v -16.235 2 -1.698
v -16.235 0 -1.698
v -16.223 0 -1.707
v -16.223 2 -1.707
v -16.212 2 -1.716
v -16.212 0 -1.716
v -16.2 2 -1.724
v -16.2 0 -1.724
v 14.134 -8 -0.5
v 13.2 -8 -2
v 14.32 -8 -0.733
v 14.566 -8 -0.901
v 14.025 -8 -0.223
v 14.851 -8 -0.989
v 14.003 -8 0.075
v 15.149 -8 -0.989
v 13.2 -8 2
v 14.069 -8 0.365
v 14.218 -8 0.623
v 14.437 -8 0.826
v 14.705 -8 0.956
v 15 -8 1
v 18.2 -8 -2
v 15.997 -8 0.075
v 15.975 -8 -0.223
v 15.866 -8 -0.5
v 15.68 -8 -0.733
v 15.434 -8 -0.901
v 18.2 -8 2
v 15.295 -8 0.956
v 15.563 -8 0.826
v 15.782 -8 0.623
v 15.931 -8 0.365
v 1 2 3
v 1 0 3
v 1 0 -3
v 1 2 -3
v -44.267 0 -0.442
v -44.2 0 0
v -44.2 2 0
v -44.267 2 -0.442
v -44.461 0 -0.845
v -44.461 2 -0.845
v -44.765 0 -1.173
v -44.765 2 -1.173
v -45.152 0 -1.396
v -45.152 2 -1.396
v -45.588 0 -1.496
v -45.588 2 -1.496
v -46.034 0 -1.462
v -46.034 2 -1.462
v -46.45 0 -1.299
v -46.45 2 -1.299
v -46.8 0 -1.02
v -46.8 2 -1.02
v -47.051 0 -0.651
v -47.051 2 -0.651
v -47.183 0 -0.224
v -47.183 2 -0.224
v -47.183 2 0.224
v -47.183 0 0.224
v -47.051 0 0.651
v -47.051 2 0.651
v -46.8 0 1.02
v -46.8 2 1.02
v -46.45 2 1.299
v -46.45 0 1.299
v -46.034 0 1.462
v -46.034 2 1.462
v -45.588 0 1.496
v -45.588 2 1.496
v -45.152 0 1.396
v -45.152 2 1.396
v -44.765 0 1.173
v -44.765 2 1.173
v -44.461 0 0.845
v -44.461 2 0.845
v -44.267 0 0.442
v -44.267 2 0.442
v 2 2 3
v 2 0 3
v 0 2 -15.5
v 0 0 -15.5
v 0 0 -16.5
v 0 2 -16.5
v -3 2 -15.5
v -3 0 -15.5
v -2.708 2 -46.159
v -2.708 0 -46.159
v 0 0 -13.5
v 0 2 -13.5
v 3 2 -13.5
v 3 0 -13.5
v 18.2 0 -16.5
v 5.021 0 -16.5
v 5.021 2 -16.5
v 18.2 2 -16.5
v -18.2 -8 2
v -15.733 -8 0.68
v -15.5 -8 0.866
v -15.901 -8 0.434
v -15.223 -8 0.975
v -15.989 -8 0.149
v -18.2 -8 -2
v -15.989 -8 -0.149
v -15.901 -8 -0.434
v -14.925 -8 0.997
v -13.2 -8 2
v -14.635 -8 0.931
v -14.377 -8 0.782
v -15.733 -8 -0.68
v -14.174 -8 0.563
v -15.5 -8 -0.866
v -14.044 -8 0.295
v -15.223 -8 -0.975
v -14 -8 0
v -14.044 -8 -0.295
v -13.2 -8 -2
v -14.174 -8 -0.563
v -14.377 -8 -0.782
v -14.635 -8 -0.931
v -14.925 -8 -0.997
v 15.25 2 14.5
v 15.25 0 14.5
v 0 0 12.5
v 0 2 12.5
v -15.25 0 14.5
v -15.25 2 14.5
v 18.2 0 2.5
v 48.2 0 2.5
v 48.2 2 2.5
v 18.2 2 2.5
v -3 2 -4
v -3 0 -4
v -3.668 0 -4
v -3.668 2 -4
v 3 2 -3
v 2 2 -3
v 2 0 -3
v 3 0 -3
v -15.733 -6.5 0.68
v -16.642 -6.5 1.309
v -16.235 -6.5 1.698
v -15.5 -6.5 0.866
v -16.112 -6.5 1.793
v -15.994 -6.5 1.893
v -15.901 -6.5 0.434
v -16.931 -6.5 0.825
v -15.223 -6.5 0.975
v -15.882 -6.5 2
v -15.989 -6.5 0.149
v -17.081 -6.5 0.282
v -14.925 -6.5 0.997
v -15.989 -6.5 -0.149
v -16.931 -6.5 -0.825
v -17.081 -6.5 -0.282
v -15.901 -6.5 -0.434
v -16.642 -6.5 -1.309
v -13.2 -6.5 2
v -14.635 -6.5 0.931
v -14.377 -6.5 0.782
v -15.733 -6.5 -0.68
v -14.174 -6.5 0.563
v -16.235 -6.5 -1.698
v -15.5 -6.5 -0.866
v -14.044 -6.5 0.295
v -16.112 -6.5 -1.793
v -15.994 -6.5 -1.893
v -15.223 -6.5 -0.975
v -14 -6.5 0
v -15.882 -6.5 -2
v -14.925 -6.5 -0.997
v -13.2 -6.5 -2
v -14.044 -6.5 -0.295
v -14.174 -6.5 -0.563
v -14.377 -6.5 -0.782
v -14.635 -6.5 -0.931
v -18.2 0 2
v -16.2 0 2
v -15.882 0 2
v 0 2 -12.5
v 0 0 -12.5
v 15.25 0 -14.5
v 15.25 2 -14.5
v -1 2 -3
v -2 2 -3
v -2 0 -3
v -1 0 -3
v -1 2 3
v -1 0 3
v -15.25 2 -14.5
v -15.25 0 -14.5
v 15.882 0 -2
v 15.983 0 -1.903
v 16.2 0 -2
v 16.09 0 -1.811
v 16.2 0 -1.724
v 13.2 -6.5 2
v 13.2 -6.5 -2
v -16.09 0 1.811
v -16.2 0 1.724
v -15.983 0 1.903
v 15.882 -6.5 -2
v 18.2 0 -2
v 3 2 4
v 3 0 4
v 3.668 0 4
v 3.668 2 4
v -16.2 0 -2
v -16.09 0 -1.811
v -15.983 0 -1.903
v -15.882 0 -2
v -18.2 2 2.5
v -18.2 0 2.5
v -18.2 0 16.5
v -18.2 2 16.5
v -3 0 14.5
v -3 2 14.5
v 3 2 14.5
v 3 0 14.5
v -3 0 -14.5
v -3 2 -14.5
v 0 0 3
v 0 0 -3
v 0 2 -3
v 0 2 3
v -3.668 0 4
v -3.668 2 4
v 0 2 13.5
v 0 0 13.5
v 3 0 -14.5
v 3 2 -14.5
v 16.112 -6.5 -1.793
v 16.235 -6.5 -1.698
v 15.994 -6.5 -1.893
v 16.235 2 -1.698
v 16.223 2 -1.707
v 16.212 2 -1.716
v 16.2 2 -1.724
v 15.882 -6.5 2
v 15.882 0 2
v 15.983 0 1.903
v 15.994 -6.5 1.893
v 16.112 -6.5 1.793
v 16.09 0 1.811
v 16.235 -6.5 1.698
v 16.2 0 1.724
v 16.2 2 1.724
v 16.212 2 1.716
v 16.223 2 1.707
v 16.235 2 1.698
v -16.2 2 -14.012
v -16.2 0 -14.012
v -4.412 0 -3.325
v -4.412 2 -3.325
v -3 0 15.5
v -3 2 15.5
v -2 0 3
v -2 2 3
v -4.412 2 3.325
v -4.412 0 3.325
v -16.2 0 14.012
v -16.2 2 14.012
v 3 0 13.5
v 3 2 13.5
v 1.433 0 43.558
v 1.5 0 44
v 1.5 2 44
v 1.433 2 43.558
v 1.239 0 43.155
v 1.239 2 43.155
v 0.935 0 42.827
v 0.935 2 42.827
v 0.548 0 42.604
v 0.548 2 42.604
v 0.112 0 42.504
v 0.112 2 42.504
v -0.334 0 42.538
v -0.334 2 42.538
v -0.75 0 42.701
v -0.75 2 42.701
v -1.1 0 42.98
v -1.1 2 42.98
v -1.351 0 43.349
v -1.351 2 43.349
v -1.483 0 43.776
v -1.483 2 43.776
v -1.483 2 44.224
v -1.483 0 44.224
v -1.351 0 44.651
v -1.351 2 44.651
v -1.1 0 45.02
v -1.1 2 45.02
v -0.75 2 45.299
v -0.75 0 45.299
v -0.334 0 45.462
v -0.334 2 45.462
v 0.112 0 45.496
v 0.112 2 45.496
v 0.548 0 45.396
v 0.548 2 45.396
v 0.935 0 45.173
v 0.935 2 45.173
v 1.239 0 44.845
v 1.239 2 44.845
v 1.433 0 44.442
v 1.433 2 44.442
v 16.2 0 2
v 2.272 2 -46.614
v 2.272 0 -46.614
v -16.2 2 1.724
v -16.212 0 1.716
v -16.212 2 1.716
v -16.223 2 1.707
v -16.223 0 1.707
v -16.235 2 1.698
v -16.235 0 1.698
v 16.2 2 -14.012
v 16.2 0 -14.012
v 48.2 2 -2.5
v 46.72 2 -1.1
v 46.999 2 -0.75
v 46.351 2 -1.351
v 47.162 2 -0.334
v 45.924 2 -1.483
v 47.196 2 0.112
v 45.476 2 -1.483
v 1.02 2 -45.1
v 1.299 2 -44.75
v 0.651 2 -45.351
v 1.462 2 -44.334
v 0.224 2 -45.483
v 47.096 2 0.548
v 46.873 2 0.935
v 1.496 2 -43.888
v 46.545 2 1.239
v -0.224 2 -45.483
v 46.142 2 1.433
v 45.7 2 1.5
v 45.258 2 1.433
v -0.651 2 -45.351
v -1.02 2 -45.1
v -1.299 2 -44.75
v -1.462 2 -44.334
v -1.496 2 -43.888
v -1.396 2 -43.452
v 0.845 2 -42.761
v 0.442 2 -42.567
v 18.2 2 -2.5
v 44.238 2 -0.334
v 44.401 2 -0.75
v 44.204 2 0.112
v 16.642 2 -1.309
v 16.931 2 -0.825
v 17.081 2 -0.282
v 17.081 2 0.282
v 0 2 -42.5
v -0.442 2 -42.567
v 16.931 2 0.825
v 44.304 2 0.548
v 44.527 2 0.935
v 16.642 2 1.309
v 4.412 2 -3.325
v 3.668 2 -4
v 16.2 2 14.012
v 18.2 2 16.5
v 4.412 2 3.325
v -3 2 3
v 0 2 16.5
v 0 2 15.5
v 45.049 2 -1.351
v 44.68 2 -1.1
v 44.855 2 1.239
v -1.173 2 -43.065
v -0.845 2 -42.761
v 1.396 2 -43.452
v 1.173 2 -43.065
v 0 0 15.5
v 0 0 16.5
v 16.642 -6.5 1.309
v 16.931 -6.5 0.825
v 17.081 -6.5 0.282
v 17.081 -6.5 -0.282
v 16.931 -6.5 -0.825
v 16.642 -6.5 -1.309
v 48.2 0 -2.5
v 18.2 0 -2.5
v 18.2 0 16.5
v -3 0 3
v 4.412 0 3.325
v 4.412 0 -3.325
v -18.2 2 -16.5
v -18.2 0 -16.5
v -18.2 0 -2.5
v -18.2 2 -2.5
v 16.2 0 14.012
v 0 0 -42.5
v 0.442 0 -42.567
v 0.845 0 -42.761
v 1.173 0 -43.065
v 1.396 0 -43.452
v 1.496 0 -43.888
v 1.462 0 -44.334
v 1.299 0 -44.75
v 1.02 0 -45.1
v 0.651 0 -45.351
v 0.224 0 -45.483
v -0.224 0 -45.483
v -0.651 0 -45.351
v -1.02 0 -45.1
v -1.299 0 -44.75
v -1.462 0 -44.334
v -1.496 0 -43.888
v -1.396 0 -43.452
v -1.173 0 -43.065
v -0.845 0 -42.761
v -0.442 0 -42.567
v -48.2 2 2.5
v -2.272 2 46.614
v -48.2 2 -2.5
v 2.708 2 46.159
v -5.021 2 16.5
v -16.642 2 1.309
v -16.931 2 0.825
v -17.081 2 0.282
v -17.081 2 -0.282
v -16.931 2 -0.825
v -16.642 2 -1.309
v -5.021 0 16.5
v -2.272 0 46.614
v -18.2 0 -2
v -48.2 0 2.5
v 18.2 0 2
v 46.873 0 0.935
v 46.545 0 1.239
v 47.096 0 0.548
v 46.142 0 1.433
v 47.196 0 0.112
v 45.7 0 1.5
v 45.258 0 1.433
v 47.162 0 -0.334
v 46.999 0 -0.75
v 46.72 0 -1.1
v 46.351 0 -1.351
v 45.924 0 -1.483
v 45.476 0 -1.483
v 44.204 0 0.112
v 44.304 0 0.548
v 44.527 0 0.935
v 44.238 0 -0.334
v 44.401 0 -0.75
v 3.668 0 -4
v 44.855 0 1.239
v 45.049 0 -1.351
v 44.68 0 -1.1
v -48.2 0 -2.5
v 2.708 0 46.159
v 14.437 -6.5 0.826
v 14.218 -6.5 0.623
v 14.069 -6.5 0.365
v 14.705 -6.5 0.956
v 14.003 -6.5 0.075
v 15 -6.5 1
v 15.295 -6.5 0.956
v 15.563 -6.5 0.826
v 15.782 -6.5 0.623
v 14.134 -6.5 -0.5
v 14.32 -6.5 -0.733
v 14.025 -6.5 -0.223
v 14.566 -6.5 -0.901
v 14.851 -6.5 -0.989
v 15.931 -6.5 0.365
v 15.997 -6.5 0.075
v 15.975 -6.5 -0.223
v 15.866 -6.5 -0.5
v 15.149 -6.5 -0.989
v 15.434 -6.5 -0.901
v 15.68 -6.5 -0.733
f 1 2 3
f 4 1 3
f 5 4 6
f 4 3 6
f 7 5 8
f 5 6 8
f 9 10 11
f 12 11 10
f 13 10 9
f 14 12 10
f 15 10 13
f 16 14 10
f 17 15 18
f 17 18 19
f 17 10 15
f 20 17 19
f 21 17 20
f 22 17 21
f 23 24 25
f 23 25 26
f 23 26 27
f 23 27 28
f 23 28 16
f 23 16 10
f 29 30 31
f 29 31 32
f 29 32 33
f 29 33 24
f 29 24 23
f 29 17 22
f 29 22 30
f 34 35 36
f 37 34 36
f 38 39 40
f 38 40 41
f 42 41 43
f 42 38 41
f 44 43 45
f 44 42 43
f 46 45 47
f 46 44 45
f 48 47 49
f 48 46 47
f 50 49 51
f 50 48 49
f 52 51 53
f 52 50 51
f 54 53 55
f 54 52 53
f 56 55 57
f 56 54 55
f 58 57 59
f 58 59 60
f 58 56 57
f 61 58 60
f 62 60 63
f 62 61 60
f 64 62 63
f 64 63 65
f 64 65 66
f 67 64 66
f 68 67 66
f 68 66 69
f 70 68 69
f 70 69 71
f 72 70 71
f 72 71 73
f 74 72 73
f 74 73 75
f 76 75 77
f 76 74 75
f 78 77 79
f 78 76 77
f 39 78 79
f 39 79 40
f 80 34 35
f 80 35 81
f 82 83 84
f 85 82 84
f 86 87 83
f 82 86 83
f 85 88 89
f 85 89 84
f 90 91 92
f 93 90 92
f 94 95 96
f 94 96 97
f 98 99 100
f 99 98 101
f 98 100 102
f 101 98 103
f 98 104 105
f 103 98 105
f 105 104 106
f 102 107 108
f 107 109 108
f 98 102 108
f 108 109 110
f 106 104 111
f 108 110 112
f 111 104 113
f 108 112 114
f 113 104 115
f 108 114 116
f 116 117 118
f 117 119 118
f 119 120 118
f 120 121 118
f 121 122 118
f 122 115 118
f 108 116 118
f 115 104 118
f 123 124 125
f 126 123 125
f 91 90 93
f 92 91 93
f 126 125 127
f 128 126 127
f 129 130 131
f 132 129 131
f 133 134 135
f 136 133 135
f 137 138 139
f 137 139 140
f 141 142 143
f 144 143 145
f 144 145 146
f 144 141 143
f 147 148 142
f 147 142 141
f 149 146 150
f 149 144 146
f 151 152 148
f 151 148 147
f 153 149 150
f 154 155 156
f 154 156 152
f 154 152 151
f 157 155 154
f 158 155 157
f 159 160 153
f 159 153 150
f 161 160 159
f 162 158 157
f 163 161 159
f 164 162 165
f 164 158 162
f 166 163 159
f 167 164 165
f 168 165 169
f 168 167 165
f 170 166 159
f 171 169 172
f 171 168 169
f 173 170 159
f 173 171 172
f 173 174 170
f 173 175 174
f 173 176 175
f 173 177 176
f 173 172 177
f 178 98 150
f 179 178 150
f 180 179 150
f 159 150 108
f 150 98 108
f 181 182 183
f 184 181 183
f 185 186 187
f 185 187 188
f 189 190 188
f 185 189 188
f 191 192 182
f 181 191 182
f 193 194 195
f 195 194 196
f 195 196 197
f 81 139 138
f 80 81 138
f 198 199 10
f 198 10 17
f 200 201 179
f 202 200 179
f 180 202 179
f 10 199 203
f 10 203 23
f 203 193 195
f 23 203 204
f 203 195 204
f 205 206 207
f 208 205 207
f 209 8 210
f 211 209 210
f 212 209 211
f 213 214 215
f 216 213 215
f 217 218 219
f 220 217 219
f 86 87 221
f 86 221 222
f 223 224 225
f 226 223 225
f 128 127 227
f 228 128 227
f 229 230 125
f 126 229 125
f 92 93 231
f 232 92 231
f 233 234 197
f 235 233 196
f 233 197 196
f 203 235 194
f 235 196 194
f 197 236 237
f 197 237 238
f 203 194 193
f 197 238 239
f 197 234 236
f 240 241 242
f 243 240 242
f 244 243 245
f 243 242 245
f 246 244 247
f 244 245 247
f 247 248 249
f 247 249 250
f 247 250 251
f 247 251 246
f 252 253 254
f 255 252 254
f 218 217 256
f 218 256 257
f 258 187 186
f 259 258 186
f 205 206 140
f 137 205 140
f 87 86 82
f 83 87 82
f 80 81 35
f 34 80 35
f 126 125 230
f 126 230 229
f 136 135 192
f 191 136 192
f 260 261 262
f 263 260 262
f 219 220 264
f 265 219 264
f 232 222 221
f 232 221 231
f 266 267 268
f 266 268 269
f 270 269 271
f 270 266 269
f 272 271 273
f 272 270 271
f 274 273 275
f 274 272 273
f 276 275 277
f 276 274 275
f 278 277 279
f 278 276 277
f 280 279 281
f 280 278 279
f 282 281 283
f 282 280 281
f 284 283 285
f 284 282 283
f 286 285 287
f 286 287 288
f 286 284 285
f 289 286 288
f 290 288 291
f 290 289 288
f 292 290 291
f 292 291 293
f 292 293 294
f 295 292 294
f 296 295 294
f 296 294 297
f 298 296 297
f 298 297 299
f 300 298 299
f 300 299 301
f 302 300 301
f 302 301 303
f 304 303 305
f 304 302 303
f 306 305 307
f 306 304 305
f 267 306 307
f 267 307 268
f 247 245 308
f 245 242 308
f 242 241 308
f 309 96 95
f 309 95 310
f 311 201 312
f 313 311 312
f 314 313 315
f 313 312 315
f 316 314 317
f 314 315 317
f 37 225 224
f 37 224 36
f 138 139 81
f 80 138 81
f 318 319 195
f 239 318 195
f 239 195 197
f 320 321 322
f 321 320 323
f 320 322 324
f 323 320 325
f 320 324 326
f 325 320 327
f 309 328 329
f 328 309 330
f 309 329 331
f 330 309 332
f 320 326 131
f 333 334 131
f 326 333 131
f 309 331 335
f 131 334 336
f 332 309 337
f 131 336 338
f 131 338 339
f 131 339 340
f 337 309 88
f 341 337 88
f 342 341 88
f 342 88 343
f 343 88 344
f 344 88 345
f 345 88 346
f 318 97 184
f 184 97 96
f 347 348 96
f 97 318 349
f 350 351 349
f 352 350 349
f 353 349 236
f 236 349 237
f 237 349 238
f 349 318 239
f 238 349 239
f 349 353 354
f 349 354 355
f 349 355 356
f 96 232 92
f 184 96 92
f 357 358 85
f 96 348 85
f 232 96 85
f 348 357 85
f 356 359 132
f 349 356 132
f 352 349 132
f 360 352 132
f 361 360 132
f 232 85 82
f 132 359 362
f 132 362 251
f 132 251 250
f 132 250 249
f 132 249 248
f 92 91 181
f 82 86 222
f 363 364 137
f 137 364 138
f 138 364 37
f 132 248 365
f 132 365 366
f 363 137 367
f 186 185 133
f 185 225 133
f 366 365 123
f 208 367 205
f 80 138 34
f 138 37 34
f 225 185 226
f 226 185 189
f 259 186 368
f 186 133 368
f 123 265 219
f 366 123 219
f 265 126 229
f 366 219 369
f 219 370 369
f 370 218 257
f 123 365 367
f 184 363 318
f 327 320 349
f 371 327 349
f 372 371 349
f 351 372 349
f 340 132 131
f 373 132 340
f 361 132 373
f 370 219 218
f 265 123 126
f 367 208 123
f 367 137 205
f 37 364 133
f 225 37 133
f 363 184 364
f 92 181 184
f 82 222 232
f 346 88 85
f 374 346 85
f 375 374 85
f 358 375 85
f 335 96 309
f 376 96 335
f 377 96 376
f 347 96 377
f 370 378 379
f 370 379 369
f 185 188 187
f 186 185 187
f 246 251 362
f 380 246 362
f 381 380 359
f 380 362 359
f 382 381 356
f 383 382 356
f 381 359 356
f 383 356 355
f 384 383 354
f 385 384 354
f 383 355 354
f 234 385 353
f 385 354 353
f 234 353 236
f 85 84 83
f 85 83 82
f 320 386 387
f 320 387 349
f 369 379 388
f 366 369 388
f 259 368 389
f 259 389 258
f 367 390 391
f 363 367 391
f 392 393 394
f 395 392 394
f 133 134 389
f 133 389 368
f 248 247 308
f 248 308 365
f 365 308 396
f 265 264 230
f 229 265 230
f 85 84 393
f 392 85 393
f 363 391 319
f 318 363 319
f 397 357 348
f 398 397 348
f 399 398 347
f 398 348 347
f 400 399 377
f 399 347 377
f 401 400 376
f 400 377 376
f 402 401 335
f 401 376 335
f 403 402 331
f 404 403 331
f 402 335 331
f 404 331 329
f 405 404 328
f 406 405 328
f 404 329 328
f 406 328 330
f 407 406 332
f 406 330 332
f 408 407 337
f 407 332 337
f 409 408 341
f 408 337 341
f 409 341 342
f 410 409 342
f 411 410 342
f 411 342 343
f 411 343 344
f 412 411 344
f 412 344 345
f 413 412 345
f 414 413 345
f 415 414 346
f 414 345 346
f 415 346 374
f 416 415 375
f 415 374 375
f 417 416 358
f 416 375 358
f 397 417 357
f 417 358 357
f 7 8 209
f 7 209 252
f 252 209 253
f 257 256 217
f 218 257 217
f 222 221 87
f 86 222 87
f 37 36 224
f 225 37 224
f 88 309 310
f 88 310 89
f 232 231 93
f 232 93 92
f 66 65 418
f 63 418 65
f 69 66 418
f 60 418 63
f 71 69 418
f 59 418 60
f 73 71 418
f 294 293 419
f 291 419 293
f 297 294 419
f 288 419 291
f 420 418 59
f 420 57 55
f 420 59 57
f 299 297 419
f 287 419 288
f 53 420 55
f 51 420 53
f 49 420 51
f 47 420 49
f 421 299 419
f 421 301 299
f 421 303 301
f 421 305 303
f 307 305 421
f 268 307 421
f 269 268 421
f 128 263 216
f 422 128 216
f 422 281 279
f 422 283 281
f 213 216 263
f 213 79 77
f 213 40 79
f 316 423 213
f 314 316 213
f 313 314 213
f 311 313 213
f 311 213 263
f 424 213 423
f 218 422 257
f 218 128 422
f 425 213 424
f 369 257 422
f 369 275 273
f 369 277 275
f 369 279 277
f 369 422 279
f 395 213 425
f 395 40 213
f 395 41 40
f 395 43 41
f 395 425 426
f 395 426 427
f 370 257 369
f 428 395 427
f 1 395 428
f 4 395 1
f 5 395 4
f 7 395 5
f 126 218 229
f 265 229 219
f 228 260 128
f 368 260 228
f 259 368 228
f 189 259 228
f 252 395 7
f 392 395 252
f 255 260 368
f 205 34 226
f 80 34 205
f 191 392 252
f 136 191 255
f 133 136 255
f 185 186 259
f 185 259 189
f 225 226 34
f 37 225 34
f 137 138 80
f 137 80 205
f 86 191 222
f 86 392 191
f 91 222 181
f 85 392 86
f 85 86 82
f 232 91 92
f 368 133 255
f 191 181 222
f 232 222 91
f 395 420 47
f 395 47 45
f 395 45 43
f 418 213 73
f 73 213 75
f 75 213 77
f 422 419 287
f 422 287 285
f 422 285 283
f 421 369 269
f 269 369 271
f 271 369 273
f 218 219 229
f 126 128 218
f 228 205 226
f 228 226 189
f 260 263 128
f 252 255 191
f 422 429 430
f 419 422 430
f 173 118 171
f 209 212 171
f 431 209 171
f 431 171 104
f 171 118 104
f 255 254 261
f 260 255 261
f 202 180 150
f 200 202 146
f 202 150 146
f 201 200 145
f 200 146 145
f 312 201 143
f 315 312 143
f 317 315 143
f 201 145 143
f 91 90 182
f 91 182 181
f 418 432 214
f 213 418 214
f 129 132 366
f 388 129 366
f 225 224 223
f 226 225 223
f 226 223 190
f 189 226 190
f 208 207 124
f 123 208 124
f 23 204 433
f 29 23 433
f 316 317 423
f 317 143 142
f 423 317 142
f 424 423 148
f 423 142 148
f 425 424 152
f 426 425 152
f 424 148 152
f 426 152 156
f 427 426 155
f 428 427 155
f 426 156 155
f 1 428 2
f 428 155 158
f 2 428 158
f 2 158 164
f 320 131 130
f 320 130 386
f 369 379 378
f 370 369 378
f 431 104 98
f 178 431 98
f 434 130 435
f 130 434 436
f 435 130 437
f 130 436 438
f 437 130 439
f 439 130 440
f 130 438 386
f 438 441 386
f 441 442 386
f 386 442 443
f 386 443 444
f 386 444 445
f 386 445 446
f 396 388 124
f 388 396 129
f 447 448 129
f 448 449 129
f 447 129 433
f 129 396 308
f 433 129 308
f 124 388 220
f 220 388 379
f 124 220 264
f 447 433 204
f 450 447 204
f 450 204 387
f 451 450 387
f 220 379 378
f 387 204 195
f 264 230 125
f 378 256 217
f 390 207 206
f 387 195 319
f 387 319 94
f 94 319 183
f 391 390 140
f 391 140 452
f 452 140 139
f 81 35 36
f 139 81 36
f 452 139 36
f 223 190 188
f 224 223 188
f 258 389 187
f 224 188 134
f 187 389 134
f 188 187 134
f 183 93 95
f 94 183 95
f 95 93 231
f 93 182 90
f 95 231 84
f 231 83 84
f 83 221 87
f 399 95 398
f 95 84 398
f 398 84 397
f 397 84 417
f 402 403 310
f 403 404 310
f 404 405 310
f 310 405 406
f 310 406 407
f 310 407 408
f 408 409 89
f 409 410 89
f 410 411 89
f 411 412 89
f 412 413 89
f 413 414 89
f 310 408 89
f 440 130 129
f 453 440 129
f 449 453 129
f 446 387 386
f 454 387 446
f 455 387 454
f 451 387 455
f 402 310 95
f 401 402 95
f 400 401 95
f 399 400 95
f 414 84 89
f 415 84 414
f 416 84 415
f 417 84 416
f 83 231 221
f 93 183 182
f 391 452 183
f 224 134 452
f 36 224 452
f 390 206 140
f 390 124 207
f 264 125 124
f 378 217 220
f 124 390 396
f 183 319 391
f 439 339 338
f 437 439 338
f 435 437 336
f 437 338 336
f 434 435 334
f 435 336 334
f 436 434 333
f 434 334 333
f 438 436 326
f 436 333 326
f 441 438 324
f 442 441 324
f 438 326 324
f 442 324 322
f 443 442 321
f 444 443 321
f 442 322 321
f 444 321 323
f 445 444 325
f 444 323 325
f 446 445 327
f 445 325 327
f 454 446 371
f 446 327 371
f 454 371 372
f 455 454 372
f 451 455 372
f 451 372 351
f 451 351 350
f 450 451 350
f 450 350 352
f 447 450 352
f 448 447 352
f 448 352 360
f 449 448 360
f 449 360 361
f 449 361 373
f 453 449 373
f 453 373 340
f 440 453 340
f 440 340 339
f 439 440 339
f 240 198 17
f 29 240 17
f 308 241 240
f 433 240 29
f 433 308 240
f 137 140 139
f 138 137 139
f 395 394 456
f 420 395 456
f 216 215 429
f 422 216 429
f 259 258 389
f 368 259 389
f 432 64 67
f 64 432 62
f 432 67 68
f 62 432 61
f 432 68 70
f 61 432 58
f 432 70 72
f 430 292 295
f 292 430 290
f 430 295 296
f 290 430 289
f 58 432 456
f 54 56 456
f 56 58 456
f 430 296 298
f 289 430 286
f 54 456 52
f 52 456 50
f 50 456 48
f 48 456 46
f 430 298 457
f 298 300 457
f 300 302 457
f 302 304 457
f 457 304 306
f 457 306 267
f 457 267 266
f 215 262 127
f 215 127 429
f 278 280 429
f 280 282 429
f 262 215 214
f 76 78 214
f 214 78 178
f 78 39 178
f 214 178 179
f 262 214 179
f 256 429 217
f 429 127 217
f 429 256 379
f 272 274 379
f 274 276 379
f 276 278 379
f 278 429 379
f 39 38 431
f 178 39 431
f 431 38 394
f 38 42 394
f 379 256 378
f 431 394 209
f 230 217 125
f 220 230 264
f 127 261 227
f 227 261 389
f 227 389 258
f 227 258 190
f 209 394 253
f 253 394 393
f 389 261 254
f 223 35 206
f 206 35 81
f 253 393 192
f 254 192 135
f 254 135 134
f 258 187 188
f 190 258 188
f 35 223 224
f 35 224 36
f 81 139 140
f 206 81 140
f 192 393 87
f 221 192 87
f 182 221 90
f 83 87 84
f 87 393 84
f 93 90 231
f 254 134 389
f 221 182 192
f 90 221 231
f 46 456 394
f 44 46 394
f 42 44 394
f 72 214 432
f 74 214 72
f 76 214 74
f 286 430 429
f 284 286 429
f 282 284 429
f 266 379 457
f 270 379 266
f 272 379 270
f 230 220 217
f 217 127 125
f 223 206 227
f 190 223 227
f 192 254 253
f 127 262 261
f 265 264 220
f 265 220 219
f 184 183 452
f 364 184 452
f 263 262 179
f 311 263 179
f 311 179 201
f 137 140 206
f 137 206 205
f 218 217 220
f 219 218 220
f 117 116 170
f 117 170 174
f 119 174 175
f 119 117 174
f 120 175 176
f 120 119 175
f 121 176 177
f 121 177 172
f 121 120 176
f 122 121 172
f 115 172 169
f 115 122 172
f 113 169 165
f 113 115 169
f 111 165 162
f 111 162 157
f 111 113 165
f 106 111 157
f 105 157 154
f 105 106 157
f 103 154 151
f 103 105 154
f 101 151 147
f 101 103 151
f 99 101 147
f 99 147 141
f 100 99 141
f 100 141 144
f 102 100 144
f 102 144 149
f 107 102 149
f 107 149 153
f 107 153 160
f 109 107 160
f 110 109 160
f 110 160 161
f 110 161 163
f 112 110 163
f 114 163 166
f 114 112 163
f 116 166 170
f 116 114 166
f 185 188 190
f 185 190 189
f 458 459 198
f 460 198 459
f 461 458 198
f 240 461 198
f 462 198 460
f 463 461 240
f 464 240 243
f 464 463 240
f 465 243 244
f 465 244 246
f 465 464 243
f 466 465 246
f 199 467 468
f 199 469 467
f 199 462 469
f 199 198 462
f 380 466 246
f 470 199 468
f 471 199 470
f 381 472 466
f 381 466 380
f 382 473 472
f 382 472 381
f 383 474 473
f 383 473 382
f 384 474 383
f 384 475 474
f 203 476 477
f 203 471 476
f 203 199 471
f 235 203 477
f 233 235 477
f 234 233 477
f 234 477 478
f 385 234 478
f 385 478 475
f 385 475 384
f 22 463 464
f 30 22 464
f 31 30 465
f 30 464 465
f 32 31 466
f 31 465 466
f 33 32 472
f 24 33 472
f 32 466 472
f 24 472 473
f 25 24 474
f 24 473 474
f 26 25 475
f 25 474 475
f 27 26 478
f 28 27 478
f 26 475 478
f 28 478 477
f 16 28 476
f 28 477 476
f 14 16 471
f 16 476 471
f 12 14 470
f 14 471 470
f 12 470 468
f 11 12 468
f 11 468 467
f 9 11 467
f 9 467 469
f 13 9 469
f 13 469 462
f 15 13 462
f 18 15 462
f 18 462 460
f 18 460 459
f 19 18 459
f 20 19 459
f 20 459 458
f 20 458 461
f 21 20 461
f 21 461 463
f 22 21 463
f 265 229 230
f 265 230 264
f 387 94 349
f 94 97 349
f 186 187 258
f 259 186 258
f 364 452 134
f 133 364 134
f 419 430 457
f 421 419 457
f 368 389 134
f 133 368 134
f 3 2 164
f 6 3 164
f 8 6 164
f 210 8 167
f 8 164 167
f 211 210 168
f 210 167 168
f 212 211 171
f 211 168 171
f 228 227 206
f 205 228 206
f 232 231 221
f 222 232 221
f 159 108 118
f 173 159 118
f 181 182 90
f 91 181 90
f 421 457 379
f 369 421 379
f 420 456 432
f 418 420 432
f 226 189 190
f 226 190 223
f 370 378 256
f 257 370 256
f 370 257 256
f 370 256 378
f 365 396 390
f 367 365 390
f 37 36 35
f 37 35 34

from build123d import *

# Parameters (mm, degrees)
SKETCH1_W           = 36.4
SKETCH1_H           = 33
BOSS_EXTRUDE1_DEPTH = 2
SKETCH2_W           = 5
SKETCH2_H           = 4
BOSS_EXTRUDE2_DEPTH = 8
SKETCH4_R           = 1
CUT_EXTRUDE2_DEPTH  = 27.162759793
CUT_EXTRUDE1_DEPTH  = 8.5
SKETCH5_W           = 2.5
SKETCH5_H           = 2
BOSS_EXTRUDE3_DEPTH = 30
SKETCH6_W           = 2.5
SKETCH6_H           = 2
BOSS_EXTRUDE4_DEPTH = 30
SKETCH11_R          = 1.5
CUT_EXTRUDE3_DEPTH  = 52.918108594
SKETCH10_R          = 1.5
BOSS_EXTRUDE5_DEPTH = 2
SPLIT2_START        = -16.5
SPLIT2_DEPTH        = 58.9999999
SPLIT2_START_2      = 16.5
SPLIT2_2_OUTLINE_W  = 6
SPLIT2_2_OUTLINE_H  = 2
SPLIT2_2_DEPTH      = 30.113981094
SPLIT2_START_3      = -3
SPLIT2_3_OUTLINE_W  = 1
SPLIT2_3_OUTLINE_H  = 2
SPLIT2_3_DEPTH      = 7
SPLIT2_START_4      = 3
SPLIT2_4_OUTLINE_W  = 3
SPLIT2_4_OUTLINE_H  = 2
SPLIT2_4_DEPTH      = 11.5
SPLIT2_START_5      = -14.5
SPLIT2_5_OUTLINE_W  = 6
SPLIT2_5_OUTLINE_H  = 2
SPLIT2_5_DEPTH      = 1
SPLIT2_6_OUTLINE_W  = 3
SPLIT2_6_OUTLINE_H  = 2
SPLIT2_6_DEPTH      = 1
SPLIT2_START_6      = -13.5
SPLIT2_7_OUTLINE_W  = 3
SPLIT2_7_OUTLINE_H  = 2
SPLIT2_7_DEPTH      = 1
SPLIT2_START_7      = 13.5
SPLIT2_8_OUTLINE_W  = 3
SPLIT2_8_OUTLINE_H  = 2
SPLIT2_8_DEPTH      = 1
SPLIT2_START_8      = 15.5
SPLIT2_9_OUTLINE_W  = 3
SPLIT2_9_OUTLINE_H  = 2
SPLIT2_9_DEPTH      = 1
SPLIT2_10_OUTLINE_W = 1
SPLIT2_10_OUTLINE_H = 2
SPLIT2_10_DEPTH     = 1
SPLIT2_11_OUTLINE_R = 1.5
SPLIT2_11_DEPTH     = 2
SPLIT2_START_9      = -8
SPLIT2_12_DEPTH     = 8
SPLIT2_13_OUTLINE_R = 1
SPLIT2_13_DEPTH     = 1.5


# Read off the part's stored shape, not the designer's step: Split2
with BuildPart() as part:
    # Sketch1 → Boss-Extrude1 (new body)
    with BuildSketch(Plane(origin=(0, 0, 0), x_dir=(1, 0, 0), z_dir=(0, 1, 0))):
        Rectangle(SKETCH1_W, SKETCH1_H)
        Polygon((3.667695956, -4), (15.249514138, -14.5), (0, -12.5), (-15.249514138, -14.5), (-3.667695956, -4), align=None, mode=Mode.SUBTRACT)
        Polygon((-4.412121212, -3.325108971), (-16.2, -14.011922158), (-16.2, 14.011922158), (-4.412121212, 3.325108971), align=None, mode=Mode.SUBTRACT)
        Polygon((-3.667695956, 4), (-15.249514138, 14.5), (0, 12.5), (15.249514138, 14.5), (3.667695956, 4), align=None, mode=Mode.SUBTRACT)
        Polygon((4.412121212, 3.325108971), (16.2, 14.011922158), (16.2, -14.011922158), (4.412121212, -3.325108971), align=None, mode=Mode.SUBTRACT)
    extrude(amount=BOSS_EXTRUDE1_DEPTH)

    # Sketch2 → Boss-Extrude2 (add)
    with BuildSketch(Plane.XZ):
        with Locations((15.7, 0)):
            Rectangle(SKETCH2_W, SKETCH2_H)
        with Locations((-15.7, 0)):
            Rectangle(SKETCH2_W, SKETCH2_H)
    extrude(amount=BOSS_EXTRUDE2_DEPTH)

    # Sketch4 → Cut-Extrude2 (cut, through all)
    with BuildSketch(Plane(origin=(0, 1, 0), x_dir=(1, 0, 0), z_dir=(0, 1, 0))):
        with Locations(Location((15, 0, 0), (0, 0, 270))):
            Circle(SKETCH4_R)
        with Locations(Location((-15, 0, 0), (0, 0, 270))):
            Circle(SKETCH4_R)
    extrude(amount=-CUT_EXTRUDE2_DEPTH, mode=Mode.SUBTRACT)

    # Sketch3 → Cut-Extrude1 (cut)
    with BuildSketch(Plane(origin=(0, 2, 0), x_dir=(1, 0, 0), z_dir=(0, 1, 0))):
        with BuildLine():
            Line((15, 4.124318125), (15, 4.257967602))
            Line((15, 4.257967602), (10.3221916, 4.257967602))
            Line((10.3221916, 4.257967602), (10.3221916, -5.239749404))
            Line((10.3221916, -5.239749404), (15, -5.239749404))
            Line((15, -5.239749404), (15, -4.124318125))
            ThreePointArc((15, -4.124318125), (15.326601634, -2.763090306), (16.235294118, -1.69824864))
            ThreePointArc((16.235294118, -1.69824864), (17.1, 0), (16.235294118, 1.69824864))
            ThreePointArc((16.235294118, 1.69824864), (15.326601634, 2.763090306), (15, 4.124318125))
        make_face()
        with BuildLine():
            Line((-10.3221916, -5.239749404), (-15, -5.239749404))
            Line((-15, -5.239749404), (-15, -4.124318125))
            ThreePointArc((-15, -4.124318125), (-15.326601634, -2.763090306), (-16.235294118, -1.69824864))
            ThreePointArc((-16.235294118, -1.69824864), (-17.1, 0), (-16.235294118, 1.69824864))
            ThreePointArc((-16.235294118, 1.69824864), (-15.326601634, 2.763090306), (-15, 4.124318125))
            Line((-15, 4.124318125), (-15, 4.257967602))
            Line((-15, 4.257967602), (-10.3221916, 4.257967602))
            Line((-10.3221916, 4.257967602), (-10.3221916, -5.239749404))
        make_face()
    extrude(amount=-CUT_EXTRUDE1_DEPTH, mode=Mode.SUBTRACT)

    # Sketch5 → Boss-Extrude3 (add)
    with BuildSketch(Plane.ZY.offset(18.2)):
        with Locations((1.25, 1)):
            Rectangle(SKETCH5_W, SKETCH5_H)
        with Locations((-1.25, 1)):
            Rectangle(SKETCH5_W, SKETCH5_H)
    extrude(amount=BOSS_EXTRUDE3_DEPTH)

    # Sketch6 → Boss-Extrude4 (add)
    with BuildSketch(Plane(origin=(18.2, 0, 0), x_dir=(0, 0, -1), z_dir=(1, 0, 0))):
        with Locations((-1.25, 1)):
            Rectangle(SKETCH6_W, SKETCH6_H)
        with Locations((1.25, 1)):
            Rectangle(SKETCH6_W, SKETCH6_H)
    extrude(amount=BOSS_EXTRUDE4_DEPTH)

    # Sketch11 → Cut-Extrude3 (cut, through all)
    with BuildSketch(Plane(origin=(0, 2, 0), x_dir=(1, 0, 0), z_dir=(0, 1, 0))):
        with Locations(Location((-45.7, 0, 0), (0, 0, 270))):
            Circle(SKETCH11_R)
        with Locations(Location((45.7, 0, 0), (0, 0, 270))):
            Circle(SKETCH11_R)
    extrude(amount=-CUT_EXTRUDE3_DEPTH, mode=Mode.SUBTRACT)

    # Sketch10 → Boss-Extrude5 (add)
    # profile 1 of 2: a face of its own
    with BuildSketch(Plane(origin=(0, 2, 0), x_dir=(1, 0, 0), z_dir=(0, 1, 0))):
        Polygon((0, -16.5), (-5.02079011, -16.5), (-2.27177232, -46.613981094), (2.707523657, -46.15943564), align=None)
        with Locations(Location((0, -44, 0), (0, 0, 270))):
            Circle(SKETCH10_R, mode=Mode.SUBTRACT)
    # profile 2 of 2: a face of its own
    with BuildSketch(Plane(origin=(0, 2, 0), x_dir=(1, 0, 0), z_dir=(0, 1, 0))):
        Polygon((0, 16.5), (5.02079011, 16.5), (2.27177232, 46.613981094), (-2.707523657, 46.15943564), align=None)
        with Locations(Location((0, 44, 0), (0, 0, 270))):
            Circle(SKETCH10_R, mode=Mode.SUBTRACT)
    extrude(amount=-BOSS_EXTRUDE5_DEPTH)

    # Split2 outline → Split2 (cut)
    with BuildSketch(Plane.XY.offset(SPLIT2_START)):
        Polygon((-4.412121212, 0), (-3, 0), (-3, 2), (-48.2, 2), (-48.2, 0), (-18.2, 0), (-18.2, -6.5), (-50, -6.5), (-50, -10), (-4.412121212, -10), align=None)
    extrude(amount=SPLIT2_DEPTH, mode=Mode.SUBTRACT)

    # Split2 2 outline → Split2 2 (cut)
    with BuildSketch(Plane.XY.offset(SPLIT2_START_2)):
        with Locations((0, 1)):
            Rectangle(SPLIT2_2_OUTLINE_W, SPLIT2_2_OUTLINE_H)
    extrude(amount=SPLIT2_2_DEPTH, mode=Mode.SUBTRACT)

    # Split2 3 outline → Split2 3 (cut)
    with BuildSketch(Plane.XY.offset(SPLIT2_START_3)):
        with Locations((0.5, 1)):
            Rectangle(SPLIT2_3_OUTLINE_W, SPLIT2_3_OUTLINE_H)
        with Locations((-1.5, 1)):
            Rectangle(SPLIT2_3_OUTLINE_W, SPLIT2_3_OUTLINE_H)
        with Locations((2.5, 1)):
            Rectangle(SPLIT2_3_OUTLINE_W, SPLIT2_3_OUTLINE_H)
    extrude(amount=SPLIT2_3_DEPTH, mode=Mode.SUBTRACT)

    # Split2 4 outline → Split2 4 (cut)
    with BuildSketch(Plane.XY.offset(SPLIT2_START_4)):
        with Locations((-1.5, 1)):
            Rectangle(SPLIT2_4_OUTLINE_W, SPLIT2_4_OUTLINE_H)
    extrude(amount=SPLIT2_4_DEPTH, mode=Mode.SUBTRACT)

    # Split2 5 outline → Split2 5 (cut)
    with BuildSketch(Plane.XY.offset(SPLIT2_START_5)):
        with Locations((0, 1)):
            Rectangle(SPLIT2_5_OUTLINE_W, SPLIT2_5_OUTLINE_H)
    extrude(amount=SPLIT2_5_DEPTH, mode=Mode.SUBTRACT)

    # Split2 6 outline → Split2 6 (cut)
    with BuildSketch(Plane.XY.offset(SPLIT2_START)):
        with Locations((-1.5, 1)):
            Rectangle(SPLIT2_6_OUTLINE_W, SPLIT2_6_OUTLINE_H)
    extrude(amount=SPLIT2_6_DEPTH, mode=Mode.SUBTRACT)

    # Split2 7 outline → Split2 7 (cut)
    with BuildSketch(Plane.XY.offset(SPLIT2_START_6)):
        with Locations((-1.5, 1)):
            Rectangle(SPLIT2_7_OUTLINE_W, SPLIT2_7_OUTLINE_H)
    extrude(amount=SPLIT2_7_DEPTH, mode=Mode.SUBTRACT)

    # Split2 8 outline → Split2 8 (cut)
    with BuildSketch(Plane.XY.offset(SPLIT2_START_7)):
        with Locations((1.5, 1)):
            Rectangle(SPLIT2_8_OUTLINE_W, SPLIT2_8_OUTLINE_H)
    extrude(amount=SPLIT2_8_DEPTH, mode=Mode.SUBTRACT)

    # Split2 9 outline → Split2 9 (cut)
    with BuildSketch(Plane.XY.offset(SPLIT2_START_8)):
        with Locations((-1.5, 1)):
            Rectangle(SPLIT2_9_OUTLINE_W, SPLIT2_9_OUTLINE_H)
    extrude(amount=SPLIT2_9_DEPTH, mode=Mode.SUBTRACT)

    # Split2 10 outline → Split2 10 (cut)
    with BuildSketch(Plane.XY.offset(SPLIT2_START_4)):
        with Locations((1.5, 1)):
            Rectangle(SPLIT2_10_OUTLINE_W, SPLIT2_10_OUTLINE_H)
    extrude(amount=SPLIT2_10_DEPTH, mode=Mode.SUBTRACT)


with BuildPart() as body_2:
    # Split2 11 outline → Split2 11 (new body)
    with BuildSketch(Plane(origin=(0, 0, 0), x_dir=(1, 0, 0), z_dir=(0, 1, 0))):
        Polygon((3, -4), (3, 3), (2, 3), (2, -3), (1, -3), (1, 3), (0, 3), (0, -3), (-1, -3), (-1, 3), (-2, 3), (-2, -3), (-3, -3), (-3, 4), (-3.667695956, 4), (-15.249514138, 14.5), (0, 12.5), (0, 13.5), (3, 13.5), (3, 14.5), (-3, 14.5), (-3, 15.5), (0, 15.5), (0, 16.5), (-18.2, 16.5), (-18.2, 2.5), (-48.2, 2.5), (-48.2, -2.5), (-18.2, -2.5), (-18.2, -16.5), (-5.02079011, -16.5), (-2.27177232, -46.613981094), (2.707523657, -46.15943564), (0, -16.5), (0, -15.5), (-3, -15.5), (-3, -14.5), (3, -14.5), (3, -13.5), (0, -13.5), (0, -12.5), (-15.249514138, -14.5), (-3.667695956, -4), align=None)
        with BuildLine():
            Line((-4.412121212, -3.325108971), (-16.2, -14.011922158))
            Line((-16.2, -14.011922158), (-16.2, -1.724318125))
            ThreePointArc((-16.2, -1.724318125), (-16.217599397, -1.711218855), (-16.235294118, -1.69824864))
            ThreePointArc((-16.235294118, -1.69824864), (-17.1, 0), (-16.235294118, 1.69824864))
            ThreePointArc((-16.235294118, 1.69824864), (-16.217599397, 1.711218855), (-16.2, 1.724318125))
            Line((-16.2, 1.724318125), (-16.2, 14.011922158))
            Line((-16.2, 14.011922158), (-4.412121212, 3.325108971))
            Line((-4.412121212, 3.325108971), (-4.412121212, -3.325108971))
        make_face(mode=Mode.SUBTRACT)
        with Locations((0, -44)):
            Circle(SPLIT2_11_OUTLINE_R, mode=Mode.SUBTRACT)
        with Locations((-45.7, 0)):
            Circle(SPLIT2_11_OUTLINE_R, mode=Mode.SUBTRACT)
    extrude(amount=SPLIT2_11_DEPTH)

    # Split2 12 outline → Split2 12 (add)
    with BuildSketch(Plane(origin=(0, 0, 0), x_dir=(1, 0, 0), z_dir=(0, 1, 0)).offset(SPLIT2_START_9)):
        with BuildLine():
            ThreePointArc((-15.881681681, -2), (-16.052634418, -1.842264819), (-16.235294118, -1.69824864))
            ThreePointArc((-16.235294118, -1.69824864), (-17.1, 0), (-16.235294118, 1.69824864))
            ThreePointArc((-16.235294118, 1.69824864), (-16.052634418, 1.842264819), (-15.881681681, 2))
            Line((-15.881681681, 2), (-18.2, 2))
            Line((-18.2, 2), (-18.2, -2))
            Line((-18.2, -2), (-15.881681681, -2))
        make_face()
    extrude(amount=SPLIT2_12_DEPTH)

    # Split2 13 outline → Split2 13 (add)
    with BuildSketch(Plane(origin=(0, 0, 0), x_dir=(1, 0, 0), z_dir=(0, 1, 0)).offset(SPLIT2_START_9)):
        with BuildLine():
            Line((-15.881681681, -2), (-13.2, -2))
            Line((-13.2, -2), (-13.2, 2))
            Line((-13.2, 2), (-15.881681681, 2))
            ThreePointArc((-15.881681681, 2), (-16.052634418, 1.842264819), (-16.235294118, 1.69824864))
            ThreePointArc((-16.235294118, 1.69824864), (-17.1, 0), (-16.235294118, -1.69824864))
            ThreePointArc((-16.235294118, -1.69824864), (-16.052634418, -1.842264819), (-15.881681681, -2))
        make_face()
        with Locations((-15, 0)):
            Circle(SPLIT2_13_OUTLINE_R, mode=Mode.SUBTRACT)
    extrude(amount=SPLIT2_13_DEPTH)


solid = Compound([part.part, body_2.part])
